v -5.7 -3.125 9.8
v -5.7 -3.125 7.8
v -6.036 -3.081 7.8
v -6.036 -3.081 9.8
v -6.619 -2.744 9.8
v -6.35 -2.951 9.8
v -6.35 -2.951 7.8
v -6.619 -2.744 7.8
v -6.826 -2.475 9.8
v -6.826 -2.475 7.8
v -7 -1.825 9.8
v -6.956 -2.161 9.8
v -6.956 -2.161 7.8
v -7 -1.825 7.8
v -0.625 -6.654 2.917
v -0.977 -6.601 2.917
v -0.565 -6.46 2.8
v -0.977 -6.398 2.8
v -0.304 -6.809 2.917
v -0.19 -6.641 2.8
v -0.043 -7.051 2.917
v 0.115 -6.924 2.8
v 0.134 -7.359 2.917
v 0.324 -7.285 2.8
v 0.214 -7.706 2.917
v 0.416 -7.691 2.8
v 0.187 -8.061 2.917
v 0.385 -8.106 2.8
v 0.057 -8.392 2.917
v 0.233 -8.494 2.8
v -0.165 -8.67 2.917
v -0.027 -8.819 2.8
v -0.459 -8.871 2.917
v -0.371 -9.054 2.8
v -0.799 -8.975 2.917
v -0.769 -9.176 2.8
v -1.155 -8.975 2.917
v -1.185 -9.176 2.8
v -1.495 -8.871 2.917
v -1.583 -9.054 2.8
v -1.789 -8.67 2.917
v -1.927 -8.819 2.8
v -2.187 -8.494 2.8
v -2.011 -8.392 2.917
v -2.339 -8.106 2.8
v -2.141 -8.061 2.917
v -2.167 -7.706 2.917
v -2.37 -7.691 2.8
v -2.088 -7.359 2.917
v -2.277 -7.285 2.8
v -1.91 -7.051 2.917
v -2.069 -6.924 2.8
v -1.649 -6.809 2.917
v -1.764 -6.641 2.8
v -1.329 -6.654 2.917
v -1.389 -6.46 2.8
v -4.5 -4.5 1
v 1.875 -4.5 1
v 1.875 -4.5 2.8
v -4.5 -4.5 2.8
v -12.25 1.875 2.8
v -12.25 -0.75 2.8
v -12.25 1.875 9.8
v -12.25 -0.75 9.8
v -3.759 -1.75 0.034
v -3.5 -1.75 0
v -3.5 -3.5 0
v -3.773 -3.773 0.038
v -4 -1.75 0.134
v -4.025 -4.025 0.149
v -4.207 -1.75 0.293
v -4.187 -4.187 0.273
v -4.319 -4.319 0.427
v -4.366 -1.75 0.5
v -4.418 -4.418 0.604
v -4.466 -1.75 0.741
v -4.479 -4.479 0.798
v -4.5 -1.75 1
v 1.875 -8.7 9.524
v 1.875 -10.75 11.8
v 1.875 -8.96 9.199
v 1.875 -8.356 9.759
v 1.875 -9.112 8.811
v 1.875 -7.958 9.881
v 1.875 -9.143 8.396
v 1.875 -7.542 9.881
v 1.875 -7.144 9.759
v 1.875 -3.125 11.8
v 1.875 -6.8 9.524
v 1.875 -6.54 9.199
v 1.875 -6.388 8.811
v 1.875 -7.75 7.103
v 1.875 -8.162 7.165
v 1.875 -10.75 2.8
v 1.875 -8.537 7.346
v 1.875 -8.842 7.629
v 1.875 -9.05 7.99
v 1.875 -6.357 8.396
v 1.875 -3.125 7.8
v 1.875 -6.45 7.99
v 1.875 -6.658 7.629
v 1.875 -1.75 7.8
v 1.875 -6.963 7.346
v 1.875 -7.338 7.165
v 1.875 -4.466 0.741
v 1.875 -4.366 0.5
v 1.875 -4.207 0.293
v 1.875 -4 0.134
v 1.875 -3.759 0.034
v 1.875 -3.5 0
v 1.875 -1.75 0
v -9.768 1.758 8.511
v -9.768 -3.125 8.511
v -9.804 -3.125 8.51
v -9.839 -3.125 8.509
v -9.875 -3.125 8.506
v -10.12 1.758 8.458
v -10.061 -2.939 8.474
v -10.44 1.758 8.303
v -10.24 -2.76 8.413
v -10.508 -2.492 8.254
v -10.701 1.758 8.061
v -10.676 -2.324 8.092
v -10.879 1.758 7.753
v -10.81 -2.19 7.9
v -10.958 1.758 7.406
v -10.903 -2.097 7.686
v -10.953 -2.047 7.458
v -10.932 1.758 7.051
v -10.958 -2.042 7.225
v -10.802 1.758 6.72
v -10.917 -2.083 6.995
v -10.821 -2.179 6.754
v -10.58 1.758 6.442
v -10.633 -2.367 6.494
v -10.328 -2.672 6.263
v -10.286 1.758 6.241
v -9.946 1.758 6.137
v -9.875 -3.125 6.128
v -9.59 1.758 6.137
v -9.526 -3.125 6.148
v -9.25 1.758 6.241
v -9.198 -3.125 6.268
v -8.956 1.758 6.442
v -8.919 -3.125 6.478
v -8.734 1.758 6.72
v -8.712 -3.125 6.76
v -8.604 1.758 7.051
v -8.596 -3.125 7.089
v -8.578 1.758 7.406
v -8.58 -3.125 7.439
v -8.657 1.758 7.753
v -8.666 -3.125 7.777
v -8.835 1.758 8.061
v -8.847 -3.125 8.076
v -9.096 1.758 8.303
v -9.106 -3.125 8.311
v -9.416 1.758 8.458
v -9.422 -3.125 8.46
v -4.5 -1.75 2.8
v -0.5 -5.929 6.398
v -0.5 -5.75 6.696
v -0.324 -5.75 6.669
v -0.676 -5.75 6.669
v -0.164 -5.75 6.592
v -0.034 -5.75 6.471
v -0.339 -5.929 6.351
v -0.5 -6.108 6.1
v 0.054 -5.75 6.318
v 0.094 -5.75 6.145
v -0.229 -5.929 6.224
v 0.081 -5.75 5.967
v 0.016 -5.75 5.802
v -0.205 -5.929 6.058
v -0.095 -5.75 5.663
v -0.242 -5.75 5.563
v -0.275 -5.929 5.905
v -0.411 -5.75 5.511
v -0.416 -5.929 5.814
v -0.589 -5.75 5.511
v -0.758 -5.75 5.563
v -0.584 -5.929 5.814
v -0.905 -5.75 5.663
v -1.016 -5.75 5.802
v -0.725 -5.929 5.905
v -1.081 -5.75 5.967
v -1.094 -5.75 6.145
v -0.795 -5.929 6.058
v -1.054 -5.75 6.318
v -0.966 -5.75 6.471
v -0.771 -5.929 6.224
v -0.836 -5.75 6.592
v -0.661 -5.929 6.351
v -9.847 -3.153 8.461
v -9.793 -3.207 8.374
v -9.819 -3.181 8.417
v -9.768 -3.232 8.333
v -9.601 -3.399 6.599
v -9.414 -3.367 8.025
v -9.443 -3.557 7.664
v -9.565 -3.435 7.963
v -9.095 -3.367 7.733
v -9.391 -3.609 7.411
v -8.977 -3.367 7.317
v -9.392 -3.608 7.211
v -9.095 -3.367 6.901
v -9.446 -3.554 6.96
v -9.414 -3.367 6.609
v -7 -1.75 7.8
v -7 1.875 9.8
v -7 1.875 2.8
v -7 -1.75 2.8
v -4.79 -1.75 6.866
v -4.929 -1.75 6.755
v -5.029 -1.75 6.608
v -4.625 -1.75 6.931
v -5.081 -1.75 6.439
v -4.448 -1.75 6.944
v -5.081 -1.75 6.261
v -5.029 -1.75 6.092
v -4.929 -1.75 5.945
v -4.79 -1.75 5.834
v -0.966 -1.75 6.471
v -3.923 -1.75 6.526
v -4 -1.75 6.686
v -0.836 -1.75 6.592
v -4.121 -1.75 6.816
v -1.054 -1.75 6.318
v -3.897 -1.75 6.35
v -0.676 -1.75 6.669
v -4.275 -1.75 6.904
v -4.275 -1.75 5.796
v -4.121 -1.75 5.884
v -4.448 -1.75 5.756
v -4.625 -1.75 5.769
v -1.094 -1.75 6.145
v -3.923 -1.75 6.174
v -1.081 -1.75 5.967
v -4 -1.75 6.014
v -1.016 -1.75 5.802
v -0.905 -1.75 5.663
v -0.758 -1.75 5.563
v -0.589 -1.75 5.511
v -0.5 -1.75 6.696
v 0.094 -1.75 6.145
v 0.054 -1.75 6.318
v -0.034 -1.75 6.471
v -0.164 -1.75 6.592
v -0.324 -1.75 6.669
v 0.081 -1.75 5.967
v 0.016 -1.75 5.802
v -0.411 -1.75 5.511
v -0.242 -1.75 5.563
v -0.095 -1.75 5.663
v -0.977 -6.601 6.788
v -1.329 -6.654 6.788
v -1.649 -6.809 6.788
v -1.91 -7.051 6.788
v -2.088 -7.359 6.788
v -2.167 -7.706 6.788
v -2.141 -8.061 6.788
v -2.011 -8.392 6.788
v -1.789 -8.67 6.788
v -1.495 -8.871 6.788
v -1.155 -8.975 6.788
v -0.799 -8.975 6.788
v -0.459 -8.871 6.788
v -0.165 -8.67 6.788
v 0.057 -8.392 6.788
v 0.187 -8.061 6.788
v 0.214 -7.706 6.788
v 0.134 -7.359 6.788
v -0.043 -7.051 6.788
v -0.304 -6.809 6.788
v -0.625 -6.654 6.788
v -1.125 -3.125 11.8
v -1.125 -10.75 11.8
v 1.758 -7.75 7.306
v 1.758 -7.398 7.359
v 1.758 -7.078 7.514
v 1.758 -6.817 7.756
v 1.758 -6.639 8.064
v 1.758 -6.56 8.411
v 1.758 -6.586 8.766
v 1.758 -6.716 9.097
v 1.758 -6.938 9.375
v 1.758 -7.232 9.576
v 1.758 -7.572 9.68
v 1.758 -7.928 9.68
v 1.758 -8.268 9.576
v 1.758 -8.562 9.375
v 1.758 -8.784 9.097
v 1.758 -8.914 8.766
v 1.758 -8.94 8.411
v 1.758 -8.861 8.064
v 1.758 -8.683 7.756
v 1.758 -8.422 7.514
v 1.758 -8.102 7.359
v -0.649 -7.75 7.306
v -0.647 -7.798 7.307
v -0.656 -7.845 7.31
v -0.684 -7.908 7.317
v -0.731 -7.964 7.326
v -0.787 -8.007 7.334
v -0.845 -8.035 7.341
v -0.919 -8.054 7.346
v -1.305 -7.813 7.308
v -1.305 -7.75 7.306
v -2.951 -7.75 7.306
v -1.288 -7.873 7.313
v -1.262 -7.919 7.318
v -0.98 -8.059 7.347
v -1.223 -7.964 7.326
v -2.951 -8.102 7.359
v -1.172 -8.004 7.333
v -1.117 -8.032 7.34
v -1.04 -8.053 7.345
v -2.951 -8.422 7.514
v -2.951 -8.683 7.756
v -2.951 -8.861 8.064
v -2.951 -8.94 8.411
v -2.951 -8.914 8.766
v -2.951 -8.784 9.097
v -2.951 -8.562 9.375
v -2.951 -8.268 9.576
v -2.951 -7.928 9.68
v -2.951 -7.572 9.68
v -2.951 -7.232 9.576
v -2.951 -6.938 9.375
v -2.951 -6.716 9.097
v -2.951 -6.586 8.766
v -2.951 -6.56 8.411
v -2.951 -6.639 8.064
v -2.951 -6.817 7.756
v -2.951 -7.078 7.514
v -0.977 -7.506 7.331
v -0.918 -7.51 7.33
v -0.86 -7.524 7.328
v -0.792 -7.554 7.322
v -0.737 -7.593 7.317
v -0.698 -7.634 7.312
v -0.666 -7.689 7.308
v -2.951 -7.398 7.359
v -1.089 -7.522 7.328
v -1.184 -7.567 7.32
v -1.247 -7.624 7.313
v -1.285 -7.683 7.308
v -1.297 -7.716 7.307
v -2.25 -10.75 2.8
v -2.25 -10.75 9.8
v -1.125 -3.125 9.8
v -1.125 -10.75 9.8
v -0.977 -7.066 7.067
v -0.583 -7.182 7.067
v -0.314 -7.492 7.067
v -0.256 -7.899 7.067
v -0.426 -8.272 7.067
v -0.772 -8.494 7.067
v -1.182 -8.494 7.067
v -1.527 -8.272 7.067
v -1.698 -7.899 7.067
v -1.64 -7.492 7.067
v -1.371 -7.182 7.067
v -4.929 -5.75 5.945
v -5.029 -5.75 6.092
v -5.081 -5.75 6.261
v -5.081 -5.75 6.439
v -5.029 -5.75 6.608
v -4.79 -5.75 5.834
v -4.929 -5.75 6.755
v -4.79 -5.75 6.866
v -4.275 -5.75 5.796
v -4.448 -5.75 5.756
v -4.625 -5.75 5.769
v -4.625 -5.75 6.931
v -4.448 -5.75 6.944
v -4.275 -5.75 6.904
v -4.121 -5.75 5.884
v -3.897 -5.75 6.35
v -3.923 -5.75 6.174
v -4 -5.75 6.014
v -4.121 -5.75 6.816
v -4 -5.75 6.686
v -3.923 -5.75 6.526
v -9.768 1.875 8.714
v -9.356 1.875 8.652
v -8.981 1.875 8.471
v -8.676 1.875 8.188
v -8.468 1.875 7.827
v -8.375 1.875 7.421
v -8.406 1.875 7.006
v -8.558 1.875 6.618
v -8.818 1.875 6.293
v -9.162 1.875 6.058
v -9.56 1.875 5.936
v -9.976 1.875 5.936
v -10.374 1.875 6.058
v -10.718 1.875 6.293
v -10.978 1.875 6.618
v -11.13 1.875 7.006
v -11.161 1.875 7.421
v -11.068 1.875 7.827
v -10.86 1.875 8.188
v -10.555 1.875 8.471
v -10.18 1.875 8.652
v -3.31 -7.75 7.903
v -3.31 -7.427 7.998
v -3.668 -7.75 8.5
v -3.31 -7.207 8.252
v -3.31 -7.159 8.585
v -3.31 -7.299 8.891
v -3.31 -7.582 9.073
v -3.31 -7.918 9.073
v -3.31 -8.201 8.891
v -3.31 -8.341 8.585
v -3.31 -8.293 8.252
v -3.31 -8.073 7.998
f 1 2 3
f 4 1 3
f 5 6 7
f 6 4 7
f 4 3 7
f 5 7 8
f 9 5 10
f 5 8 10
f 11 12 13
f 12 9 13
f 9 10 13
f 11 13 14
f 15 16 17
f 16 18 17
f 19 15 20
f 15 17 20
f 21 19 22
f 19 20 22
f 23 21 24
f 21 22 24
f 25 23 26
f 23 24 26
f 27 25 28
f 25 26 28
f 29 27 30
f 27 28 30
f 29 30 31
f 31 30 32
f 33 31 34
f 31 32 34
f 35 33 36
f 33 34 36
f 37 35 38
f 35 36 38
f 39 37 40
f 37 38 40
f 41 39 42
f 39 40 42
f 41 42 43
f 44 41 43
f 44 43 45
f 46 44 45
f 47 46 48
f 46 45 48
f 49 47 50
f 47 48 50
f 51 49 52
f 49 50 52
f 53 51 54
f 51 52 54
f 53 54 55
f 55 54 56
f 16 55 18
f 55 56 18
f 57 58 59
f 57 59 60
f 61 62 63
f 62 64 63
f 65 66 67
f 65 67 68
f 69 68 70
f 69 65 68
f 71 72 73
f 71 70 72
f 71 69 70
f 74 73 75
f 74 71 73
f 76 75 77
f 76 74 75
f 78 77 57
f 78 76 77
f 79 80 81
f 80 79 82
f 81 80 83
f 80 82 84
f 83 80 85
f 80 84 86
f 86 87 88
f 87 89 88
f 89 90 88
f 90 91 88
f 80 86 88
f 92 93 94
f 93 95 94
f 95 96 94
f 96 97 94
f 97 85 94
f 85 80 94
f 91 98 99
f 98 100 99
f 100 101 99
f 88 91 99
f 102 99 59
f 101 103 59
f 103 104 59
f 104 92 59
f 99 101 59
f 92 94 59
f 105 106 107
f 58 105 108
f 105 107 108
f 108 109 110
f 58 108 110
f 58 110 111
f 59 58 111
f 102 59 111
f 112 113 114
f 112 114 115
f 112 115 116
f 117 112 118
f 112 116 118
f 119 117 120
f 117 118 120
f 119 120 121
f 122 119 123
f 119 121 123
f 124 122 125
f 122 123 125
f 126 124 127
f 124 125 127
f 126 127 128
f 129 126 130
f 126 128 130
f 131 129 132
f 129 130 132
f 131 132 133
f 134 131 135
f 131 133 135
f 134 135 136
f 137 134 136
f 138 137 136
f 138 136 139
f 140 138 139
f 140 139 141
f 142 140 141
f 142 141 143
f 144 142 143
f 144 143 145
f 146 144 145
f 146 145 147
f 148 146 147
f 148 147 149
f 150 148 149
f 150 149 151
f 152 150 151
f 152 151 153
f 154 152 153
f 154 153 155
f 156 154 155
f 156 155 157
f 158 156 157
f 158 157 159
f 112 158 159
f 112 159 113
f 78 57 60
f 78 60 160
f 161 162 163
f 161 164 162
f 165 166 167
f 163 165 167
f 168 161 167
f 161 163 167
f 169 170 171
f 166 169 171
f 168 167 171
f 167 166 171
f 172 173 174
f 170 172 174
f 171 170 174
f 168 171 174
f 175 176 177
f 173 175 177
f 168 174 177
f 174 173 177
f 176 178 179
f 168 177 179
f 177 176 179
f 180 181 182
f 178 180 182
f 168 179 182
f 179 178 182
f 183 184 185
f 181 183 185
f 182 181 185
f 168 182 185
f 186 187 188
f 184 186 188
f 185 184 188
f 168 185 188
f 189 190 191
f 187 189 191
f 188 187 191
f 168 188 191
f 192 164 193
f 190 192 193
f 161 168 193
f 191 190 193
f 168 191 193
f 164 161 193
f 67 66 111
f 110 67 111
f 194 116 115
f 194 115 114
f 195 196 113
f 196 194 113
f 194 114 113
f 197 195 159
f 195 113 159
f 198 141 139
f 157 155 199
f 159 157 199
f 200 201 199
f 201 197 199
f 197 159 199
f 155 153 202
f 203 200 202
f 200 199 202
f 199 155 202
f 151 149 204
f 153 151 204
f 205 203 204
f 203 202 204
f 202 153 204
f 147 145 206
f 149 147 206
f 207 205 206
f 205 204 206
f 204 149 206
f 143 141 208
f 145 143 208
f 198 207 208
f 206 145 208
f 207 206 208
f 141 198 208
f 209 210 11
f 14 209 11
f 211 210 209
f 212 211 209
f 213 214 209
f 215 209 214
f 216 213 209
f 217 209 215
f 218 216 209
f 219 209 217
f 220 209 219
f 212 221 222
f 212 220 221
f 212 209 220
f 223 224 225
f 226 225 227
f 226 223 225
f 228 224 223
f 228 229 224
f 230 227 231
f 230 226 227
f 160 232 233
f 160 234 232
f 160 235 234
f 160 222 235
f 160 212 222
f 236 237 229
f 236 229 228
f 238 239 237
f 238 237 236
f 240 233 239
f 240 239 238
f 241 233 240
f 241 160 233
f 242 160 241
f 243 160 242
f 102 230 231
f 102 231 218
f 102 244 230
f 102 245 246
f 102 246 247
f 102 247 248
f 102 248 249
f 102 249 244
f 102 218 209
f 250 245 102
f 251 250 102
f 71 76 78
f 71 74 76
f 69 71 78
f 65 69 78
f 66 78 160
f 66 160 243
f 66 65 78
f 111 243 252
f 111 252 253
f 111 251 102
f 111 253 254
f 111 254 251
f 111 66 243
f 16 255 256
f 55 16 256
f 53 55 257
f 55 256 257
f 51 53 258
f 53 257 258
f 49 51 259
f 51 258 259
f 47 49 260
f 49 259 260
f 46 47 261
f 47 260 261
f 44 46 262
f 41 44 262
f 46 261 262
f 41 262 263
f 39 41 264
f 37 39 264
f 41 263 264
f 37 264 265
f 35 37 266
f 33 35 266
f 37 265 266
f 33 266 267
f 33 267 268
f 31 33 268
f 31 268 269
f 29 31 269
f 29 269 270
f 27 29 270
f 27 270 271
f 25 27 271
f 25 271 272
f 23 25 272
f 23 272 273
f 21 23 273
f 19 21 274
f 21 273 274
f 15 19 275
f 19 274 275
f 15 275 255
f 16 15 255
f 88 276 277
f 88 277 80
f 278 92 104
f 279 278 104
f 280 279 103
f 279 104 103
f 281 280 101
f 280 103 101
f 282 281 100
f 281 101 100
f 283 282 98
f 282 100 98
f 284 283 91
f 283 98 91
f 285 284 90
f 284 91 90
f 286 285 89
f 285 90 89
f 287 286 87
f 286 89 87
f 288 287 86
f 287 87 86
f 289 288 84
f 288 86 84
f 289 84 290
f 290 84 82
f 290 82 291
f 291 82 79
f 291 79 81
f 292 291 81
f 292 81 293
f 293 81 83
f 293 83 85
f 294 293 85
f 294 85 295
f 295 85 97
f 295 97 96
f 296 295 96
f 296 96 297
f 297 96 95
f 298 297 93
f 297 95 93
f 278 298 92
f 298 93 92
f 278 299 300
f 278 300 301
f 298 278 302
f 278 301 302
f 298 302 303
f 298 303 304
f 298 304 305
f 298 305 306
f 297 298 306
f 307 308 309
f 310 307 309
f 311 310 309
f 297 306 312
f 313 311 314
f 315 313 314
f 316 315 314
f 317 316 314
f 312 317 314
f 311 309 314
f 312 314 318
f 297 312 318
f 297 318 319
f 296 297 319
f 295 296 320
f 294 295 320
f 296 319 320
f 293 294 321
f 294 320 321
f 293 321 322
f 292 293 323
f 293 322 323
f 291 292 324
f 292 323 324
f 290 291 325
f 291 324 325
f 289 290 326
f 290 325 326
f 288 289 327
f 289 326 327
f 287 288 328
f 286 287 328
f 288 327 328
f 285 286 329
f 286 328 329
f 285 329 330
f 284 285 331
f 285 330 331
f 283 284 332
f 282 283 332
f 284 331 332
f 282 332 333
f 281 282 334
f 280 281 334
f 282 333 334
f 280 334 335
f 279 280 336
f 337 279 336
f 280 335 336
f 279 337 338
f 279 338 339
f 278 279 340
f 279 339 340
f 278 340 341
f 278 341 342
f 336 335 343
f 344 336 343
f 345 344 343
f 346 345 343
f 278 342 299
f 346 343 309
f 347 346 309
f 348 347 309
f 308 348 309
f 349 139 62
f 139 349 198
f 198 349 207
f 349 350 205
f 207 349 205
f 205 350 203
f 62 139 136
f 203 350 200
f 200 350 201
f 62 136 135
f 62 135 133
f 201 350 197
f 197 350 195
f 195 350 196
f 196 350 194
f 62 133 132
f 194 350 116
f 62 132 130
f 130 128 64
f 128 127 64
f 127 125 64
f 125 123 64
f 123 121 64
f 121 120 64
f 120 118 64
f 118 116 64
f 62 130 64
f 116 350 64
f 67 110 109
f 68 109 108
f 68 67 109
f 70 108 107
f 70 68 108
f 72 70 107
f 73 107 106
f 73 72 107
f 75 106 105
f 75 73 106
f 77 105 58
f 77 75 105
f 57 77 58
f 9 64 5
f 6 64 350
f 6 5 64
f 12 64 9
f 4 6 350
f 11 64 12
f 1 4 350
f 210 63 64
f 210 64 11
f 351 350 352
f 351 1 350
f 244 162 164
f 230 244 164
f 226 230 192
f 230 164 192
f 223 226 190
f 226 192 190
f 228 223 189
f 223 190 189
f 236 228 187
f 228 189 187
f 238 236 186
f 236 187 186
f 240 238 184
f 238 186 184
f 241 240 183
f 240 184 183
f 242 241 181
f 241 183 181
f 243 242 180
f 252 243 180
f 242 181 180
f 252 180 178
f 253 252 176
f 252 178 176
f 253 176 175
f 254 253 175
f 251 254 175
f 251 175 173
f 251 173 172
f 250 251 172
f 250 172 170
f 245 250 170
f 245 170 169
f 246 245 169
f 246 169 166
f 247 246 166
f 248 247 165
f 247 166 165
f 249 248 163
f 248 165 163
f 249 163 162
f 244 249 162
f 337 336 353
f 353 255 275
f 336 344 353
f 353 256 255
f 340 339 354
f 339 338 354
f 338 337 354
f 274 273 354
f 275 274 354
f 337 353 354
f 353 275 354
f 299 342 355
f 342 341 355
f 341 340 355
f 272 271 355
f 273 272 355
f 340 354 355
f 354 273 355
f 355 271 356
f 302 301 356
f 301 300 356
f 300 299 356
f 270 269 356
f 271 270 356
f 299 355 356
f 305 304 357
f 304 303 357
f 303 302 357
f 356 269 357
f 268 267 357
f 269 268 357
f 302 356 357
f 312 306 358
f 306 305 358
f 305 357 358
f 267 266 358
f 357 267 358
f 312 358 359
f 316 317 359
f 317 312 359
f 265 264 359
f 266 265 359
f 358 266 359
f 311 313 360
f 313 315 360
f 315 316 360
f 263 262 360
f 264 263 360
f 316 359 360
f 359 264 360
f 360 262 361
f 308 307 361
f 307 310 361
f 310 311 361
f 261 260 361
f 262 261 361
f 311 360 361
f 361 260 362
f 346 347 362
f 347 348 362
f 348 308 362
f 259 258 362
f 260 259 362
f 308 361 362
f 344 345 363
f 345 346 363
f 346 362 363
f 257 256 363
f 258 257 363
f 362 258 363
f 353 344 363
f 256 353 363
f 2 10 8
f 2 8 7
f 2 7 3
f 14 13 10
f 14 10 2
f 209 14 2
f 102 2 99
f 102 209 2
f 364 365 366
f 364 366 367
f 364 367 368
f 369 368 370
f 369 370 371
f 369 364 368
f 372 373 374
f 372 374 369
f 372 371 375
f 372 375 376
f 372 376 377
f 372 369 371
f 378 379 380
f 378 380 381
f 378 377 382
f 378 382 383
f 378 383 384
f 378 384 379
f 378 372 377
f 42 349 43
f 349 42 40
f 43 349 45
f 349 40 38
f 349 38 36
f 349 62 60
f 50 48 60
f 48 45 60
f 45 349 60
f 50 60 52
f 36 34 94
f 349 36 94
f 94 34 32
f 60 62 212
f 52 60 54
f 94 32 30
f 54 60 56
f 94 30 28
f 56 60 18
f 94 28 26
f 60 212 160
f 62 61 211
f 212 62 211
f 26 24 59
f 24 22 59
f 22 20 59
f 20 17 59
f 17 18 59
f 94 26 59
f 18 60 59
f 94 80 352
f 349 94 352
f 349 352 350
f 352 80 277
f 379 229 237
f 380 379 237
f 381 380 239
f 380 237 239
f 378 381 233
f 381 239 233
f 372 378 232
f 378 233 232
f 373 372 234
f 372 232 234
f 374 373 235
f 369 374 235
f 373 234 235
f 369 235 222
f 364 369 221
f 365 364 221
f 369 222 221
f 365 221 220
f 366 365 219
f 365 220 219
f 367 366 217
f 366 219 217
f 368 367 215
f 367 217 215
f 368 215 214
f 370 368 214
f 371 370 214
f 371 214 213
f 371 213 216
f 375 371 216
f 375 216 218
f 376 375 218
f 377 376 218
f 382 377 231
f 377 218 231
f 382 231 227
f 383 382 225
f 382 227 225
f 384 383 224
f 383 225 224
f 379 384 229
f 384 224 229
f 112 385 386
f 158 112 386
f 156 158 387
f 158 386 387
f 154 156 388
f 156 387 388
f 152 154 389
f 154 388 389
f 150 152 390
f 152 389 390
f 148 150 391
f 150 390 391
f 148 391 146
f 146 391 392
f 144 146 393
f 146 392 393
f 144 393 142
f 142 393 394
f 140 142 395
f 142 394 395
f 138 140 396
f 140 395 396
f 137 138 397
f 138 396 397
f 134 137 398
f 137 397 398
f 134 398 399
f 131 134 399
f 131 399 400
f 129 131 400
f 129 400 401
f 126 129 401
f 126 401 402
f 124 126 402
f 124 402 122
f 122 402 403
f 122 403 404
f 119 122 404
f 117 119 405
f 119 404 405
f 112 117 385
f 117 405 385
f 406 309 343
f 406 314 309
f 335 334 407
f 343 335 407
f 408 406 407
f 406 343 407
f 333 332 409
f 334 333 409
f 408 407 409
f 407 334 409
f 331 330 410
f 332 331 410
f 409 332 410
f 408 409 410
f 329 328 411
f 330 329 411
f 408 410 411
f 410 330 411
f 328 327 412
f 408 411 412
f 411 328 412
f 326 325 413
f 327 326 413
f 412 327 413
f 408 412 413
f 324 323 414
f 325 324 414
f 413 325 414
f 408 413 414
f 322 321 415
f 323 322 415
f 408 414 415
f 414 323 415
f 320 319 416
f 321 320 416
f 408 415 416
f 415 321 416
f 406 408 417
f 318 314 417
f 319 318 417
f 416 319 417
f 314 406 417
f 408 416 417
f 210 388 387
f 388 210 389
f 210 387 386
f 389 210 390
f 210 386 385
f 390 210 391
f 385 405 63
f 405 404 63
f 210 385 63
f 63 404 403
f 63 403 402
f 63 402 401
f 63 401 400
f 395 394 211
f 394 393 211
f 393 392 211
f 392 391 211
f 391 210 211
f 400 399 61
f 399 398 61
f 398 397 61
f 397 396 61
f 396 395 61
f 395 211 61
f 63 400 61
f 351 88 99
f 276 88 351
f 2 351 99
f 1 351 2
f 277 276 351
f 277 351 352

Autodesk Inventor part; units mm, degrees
ref_plane "YZ Plane" through (0, 0, 0) normal (1, 0, 0) x (0, 1, 0)
ref_plane "XZ Plane" through (0, 0, 0) normal (0, 1, 0) x (-1, 0, 0)
ref_plane "XY Plane" through (0, 0, 0) normal (0, 0, 1) x (1, 0, 0)
sketch "Sketch1" plane through (0, 0, 0) normal (0, 0, 1) x (1, 0, 0)
  line L0 (-4.5, 4.25) -> (4.25, 4.25)
  line L1 (4.25, 4.25) -> (4.25, -4.5)
  line L2 (4.25, -4.5) -> (-4.5, -4.5)
  line L3 (-4.5, -4.5) -> (-4.5, 4.25)
  point P0 (0, 0)
  dimension "d0" = 8.75
  dimension "d1" = 8.75
  dimension "d2" = 4.25
  dimension "d3" = 4.25
extrude "Extrusion1" add sketch "Sketch1" along normal blind 2.8
fillet "Fillet2" radius 1 3 edges at (4.25, 4.25, 1.4) (4.25, -0.125, 0) (-0.125, 4.25, 0)
sketch "Sketch10" plane through (0, 0, 2.8) normal (0, 0, 1) x (1, 0, 0)
  line L0 (4.25, 3.25) -> (4.25, -4.5) projected
  line L1 (-4.5, 4.25) -> (3.25, 4.25) projected
  line L2 (3.25, 3.25) -> (-17.75, 3.25)
  line L3 (-17.75, 3.25) -> (-17.75, -17.75)
  line L4 (-17.75, -17.75) -> (3.25, -17.75)
  line L5 (3.25, -17.75) -> (3.25, 3.25)
  point P0 (0, 0)
  dimension "d113" = 1
  dimension "d114" = 1
  dimension "d115" = 21
  dimension "d116" = 21
extrude "Extrusion8" add sketch "Sketch10" along normal blind 9
hole "Hole11" [suppressed]
sketch "Sketch11" plane through (0, 0, 2.8) normal (0, 0, -1) x (-1, 0, 0)
  line L0 (17.75, -17.75) -> (-3.25, -17.75) projected
  line L1 (17.75, 3.25) -> (17.75, -17.75) projected
  line L2 (4.5, 3.25) -> (17.75, 3.25) projected
  line L3 (12.25, 3.25) -> (17.75, 3.25)
  line L4 (17.75, 3.25) -> (17.75, -17.75)
  line L5 (17.75, -17.75) -> (-3.25, -17.75)
  line L6 (-3.25, -17.75) -> (-3.25, -10.75)
  line L7 (-3.25, -10.75) -> (2.25, -10.75)
  line L8 (2.25, -10.75) -> (12.25, -0.75)
  line L9 (12.25, -0.75) -> (12.25, 3.25)
  point P0 (0, 0)
  dimension "d146" = 14
  dimension "d158" = 4
  dimension "d254" = 15.5
  dimension "d255" = 45
extrude "Extrusion9" cut sketch "Sketch11" along normal through all both and the other way through all
hole "Hole12" [suppressed]
hole "Hole13" [suppressed]
chamfer "Chamfer3" [suppressed]
chamfer "Chamfer4" [suppressed]
sketch "Sketch18" plane through (0, 0, 0) normal (0, 0, -1) x (-1, 0, 0)
  line L0 (7, 5.953) -> (7, -1.75)
  line L1 (7, -1.75) -> (-6.3618, -1.75)
  line L2 (-3.25, 3.25) -> (4.5, 3.25) projected
  line L3 (-3.25, -4.5) -> (-3.25, 3.25) projected
  line L4 (7, 5.953) -> (-6.3618, 5.953)
  line L5 (-6.3618, 5.953) -> (-6.3618, -1.75)
  point P0 (0, 0)
  dimension "d226" = 2.703
  dimension "d227" = 3.1118
  dimension "d228" = 5
  dimension "d229" = 10.25
extrude "Extrusion12" cut sketch "Sketch18" against normal through all
hole "Hole16" at (-0.5, -1.75, 6.1) direction (0, -1, 0) diameter 1.1913 depth 4 tip angle 118
pattern_linear "Rectangular Pattern1" [suppressed]
chamfer "Chamfer7" [suppressed]
sketch "Sketch19" plane through (-4.5, -1.75, 0) normal (0, 1, 0) x (1, 0, 0)
  circle A0 centre (4, -6.1) radius 0.5956 projected
  circle A1 centre (0.0078, -6.35) radius 0.5956
  point P0 (4.5, 0)
  dimension "d230" = 0.25
  dimension "d231" = 4
extrude "Extrusion13" cut sketch "Sketch19" against normal blind 4 contours A1
sketch "Sketch21" plane through (0, 0, 2.8) normal (0, 0, -1) x (-1, 0, 0)
  line L0 (7, 3.25) -> (7, -1.75) projected
  line L1 (7, -1.75) -> (4.5, -1.75) projected
  line L2 (-3.25, -10.75) -> (-3.25, -4.5) projected
  line L3 (-3.25, -10.75) -> (2.25, -10.75) projected
  line L4 (2.25, -10.75) -> (12.25, -0.75) projected
  line L5 (12.25, -0.75) -> (12.25, 3.25) projected
  line L6 (7, 3.25) -> (12.25, 3.25) projected
  line L7 (12.25, 4.25) -> (12.25, -0.75)
  line L8 (12.25, -0.75) -> (2.25, -10.75)
  line L9 (2.25, -10.75) -> (-4.25, -10.75)
  line L10 (-4.25, -10.75) -> (-4.25, -4.5)
  line L11 (-4.25, -4.5) -> (4.5, -4.5)
  line L12 (4.5, -4.5) -> (4.5, -1.75)
  line L13 (4.5, -1.75) -> (7, -1.75)
  line L14 (7, -1.75) -> (7, 4.25)
  line L15 (7, 4.25) -> (12.25, 4.25)
  line L16 (-3.25, -4.5) -> (4.5, -4.5) projected
  line L17 (4.5, -4.5) -> (4.5, -1.75) projected
  point P0 (0, 0)
  dimension "d236" = 1
  dimension "d237" = 1
extrude "Extrusion14" [suppressed]
chamfer "Chamfer8" [suppressed]
sketch "Sketch23" plane through (0, 0, 0) normal (0, 0, -1) x (-1, 0, 0)
  line L0 (-4.25, 4.25) -> (20.75, 4.25)
  line L1 (-4.25, -20.75) -> (-4.25, 4.25)
  line L2 (-1.875, -20.75) -> (-1.875, 1.875)
  line L3 (-1.875, 1.875) -> (20.75, 1.875)
  line L4 (4.5, -4.5) -> (4.5, -1.75) projected
  line L5 (20.75, 1.875) -> (20.75, 4.25)
  line L6 (-1.875, -20.75) -> (-4.25, -20.75)
  point P0 (0, 0)
  dimension "d245" = 2.375
  dimension "d249" = 1.875
  dimension "d250" = 1.875
  dimension "d251" = 25
  dimension "d252" = 25
extrude "Extrusion16" cut sketch "Sketch23" against normal through all
hole "Hole10" at (-9.768, 1.875, 7.317) direction (0, -1, 0) diameter 2.3876 depth 5 tip angle 118 countersink diameter 2.794 countersink angle 120
fillet "Fillet4" radius 1 2 edges at (-1.3125, -4.5, 0) (-4.5, -3.125, 0)
hole "Hole18" at (1.875, -7.75, 8.5) direction (-1, 0, 0) diameter 2.3876 depth 4.826 tip angle 118 countersink diameter 2.794 countersink angle 120
hole "Hole17" at (-0.9768, -7.795, 2.8) direction (0, 0, 1) diameter 2.3876 depth 3.9878 tip angle 118 countersink diameter 2.794 countersink angle 120
sketch "Sketch24" plane through (0, 0, 11.8) normal (0, 0, 1) x (1, 0, 0)
  line L0 (1.875, -10.75) -> (1.875, -1.75) projected
  line L1 (-7, 1.875) -> (1.875, 1.875)
  line L2 (1.875, 1.875) -> (1.875, -3.125)
  line L3 (1.875, -3.125) -> (-7, -3.125)
  line L4 (-7, 1.875) -> (-7, -3.125)
  line L5 (-7, 1.875) -> (-12.25, 1.875) projected
  point P0 (0, 0)
  dimension "d276" = 5
extrude "Extrusion17" cut sketch "Sketch24" against normal blind 4
sketch "Sketch25" plane through (0, 0, 11.8) normal (0, 0, 1) x (1, 0, 0)
  line L0 (-12.25, 1.875) -> (-12.25, -0.75) projected
  line L1 (-12.25, -0.75) -> (-2.25, -10.75) projected
  line L2 (-12.25, 1.875) -> (-6.5, 1.875)
  line L3 (-6.5, 1.875) -> (-6.5, -6.5)
  line L4 (-6.5, -6.5) -> (-12.25, -6.5)
  line L5 (-12.25, -6.5) -> (-12.25, 1.875)
  point P0 (0, 0)
extrude "Extrusion18" cut sketch "Sketch25" against normal blind 2 contours L2 L3 L1 L0
sketch "Sketch26" plane through (0, 0, 11.8) normal (0, 0, 1) x (1, 0, 0)
  line L0 (-6.5, -3.125) -> (-6.5, -6.5) projected
  line L1 (-6.5, -6.5) -> (-2.25, -10.75) projected
  line L2 (-2.25, -10.75) -> (1.875, -10.75) projected
  line L3 (1.875, -10.75) -> (1.875, -3.125) projected
  line L4 (-6.5, -3.125) -> (-1.125, -3.125)
  line L5 (-1.125, -3.125) -> (-1.125, -10.75)
  line L6 (-1.125, -10.75) -> (-6.5, -10.75)
  line L7 (-6.5, -10.75) -> (-6.5, -3.125)
  point P0 (0, 0)
  dimension "d281" = 3
extrude "Extrusion19" cut sketch "Sketch26" against normal up to surface (2 mm away) contours L4 L5 L2 L1 L0
fillet "Fillet5" radius 1.3 1 edges at (-7, -3.125, 8.8)
properties part number "FOX-ME-121-05" material "Aluminum-6061"
